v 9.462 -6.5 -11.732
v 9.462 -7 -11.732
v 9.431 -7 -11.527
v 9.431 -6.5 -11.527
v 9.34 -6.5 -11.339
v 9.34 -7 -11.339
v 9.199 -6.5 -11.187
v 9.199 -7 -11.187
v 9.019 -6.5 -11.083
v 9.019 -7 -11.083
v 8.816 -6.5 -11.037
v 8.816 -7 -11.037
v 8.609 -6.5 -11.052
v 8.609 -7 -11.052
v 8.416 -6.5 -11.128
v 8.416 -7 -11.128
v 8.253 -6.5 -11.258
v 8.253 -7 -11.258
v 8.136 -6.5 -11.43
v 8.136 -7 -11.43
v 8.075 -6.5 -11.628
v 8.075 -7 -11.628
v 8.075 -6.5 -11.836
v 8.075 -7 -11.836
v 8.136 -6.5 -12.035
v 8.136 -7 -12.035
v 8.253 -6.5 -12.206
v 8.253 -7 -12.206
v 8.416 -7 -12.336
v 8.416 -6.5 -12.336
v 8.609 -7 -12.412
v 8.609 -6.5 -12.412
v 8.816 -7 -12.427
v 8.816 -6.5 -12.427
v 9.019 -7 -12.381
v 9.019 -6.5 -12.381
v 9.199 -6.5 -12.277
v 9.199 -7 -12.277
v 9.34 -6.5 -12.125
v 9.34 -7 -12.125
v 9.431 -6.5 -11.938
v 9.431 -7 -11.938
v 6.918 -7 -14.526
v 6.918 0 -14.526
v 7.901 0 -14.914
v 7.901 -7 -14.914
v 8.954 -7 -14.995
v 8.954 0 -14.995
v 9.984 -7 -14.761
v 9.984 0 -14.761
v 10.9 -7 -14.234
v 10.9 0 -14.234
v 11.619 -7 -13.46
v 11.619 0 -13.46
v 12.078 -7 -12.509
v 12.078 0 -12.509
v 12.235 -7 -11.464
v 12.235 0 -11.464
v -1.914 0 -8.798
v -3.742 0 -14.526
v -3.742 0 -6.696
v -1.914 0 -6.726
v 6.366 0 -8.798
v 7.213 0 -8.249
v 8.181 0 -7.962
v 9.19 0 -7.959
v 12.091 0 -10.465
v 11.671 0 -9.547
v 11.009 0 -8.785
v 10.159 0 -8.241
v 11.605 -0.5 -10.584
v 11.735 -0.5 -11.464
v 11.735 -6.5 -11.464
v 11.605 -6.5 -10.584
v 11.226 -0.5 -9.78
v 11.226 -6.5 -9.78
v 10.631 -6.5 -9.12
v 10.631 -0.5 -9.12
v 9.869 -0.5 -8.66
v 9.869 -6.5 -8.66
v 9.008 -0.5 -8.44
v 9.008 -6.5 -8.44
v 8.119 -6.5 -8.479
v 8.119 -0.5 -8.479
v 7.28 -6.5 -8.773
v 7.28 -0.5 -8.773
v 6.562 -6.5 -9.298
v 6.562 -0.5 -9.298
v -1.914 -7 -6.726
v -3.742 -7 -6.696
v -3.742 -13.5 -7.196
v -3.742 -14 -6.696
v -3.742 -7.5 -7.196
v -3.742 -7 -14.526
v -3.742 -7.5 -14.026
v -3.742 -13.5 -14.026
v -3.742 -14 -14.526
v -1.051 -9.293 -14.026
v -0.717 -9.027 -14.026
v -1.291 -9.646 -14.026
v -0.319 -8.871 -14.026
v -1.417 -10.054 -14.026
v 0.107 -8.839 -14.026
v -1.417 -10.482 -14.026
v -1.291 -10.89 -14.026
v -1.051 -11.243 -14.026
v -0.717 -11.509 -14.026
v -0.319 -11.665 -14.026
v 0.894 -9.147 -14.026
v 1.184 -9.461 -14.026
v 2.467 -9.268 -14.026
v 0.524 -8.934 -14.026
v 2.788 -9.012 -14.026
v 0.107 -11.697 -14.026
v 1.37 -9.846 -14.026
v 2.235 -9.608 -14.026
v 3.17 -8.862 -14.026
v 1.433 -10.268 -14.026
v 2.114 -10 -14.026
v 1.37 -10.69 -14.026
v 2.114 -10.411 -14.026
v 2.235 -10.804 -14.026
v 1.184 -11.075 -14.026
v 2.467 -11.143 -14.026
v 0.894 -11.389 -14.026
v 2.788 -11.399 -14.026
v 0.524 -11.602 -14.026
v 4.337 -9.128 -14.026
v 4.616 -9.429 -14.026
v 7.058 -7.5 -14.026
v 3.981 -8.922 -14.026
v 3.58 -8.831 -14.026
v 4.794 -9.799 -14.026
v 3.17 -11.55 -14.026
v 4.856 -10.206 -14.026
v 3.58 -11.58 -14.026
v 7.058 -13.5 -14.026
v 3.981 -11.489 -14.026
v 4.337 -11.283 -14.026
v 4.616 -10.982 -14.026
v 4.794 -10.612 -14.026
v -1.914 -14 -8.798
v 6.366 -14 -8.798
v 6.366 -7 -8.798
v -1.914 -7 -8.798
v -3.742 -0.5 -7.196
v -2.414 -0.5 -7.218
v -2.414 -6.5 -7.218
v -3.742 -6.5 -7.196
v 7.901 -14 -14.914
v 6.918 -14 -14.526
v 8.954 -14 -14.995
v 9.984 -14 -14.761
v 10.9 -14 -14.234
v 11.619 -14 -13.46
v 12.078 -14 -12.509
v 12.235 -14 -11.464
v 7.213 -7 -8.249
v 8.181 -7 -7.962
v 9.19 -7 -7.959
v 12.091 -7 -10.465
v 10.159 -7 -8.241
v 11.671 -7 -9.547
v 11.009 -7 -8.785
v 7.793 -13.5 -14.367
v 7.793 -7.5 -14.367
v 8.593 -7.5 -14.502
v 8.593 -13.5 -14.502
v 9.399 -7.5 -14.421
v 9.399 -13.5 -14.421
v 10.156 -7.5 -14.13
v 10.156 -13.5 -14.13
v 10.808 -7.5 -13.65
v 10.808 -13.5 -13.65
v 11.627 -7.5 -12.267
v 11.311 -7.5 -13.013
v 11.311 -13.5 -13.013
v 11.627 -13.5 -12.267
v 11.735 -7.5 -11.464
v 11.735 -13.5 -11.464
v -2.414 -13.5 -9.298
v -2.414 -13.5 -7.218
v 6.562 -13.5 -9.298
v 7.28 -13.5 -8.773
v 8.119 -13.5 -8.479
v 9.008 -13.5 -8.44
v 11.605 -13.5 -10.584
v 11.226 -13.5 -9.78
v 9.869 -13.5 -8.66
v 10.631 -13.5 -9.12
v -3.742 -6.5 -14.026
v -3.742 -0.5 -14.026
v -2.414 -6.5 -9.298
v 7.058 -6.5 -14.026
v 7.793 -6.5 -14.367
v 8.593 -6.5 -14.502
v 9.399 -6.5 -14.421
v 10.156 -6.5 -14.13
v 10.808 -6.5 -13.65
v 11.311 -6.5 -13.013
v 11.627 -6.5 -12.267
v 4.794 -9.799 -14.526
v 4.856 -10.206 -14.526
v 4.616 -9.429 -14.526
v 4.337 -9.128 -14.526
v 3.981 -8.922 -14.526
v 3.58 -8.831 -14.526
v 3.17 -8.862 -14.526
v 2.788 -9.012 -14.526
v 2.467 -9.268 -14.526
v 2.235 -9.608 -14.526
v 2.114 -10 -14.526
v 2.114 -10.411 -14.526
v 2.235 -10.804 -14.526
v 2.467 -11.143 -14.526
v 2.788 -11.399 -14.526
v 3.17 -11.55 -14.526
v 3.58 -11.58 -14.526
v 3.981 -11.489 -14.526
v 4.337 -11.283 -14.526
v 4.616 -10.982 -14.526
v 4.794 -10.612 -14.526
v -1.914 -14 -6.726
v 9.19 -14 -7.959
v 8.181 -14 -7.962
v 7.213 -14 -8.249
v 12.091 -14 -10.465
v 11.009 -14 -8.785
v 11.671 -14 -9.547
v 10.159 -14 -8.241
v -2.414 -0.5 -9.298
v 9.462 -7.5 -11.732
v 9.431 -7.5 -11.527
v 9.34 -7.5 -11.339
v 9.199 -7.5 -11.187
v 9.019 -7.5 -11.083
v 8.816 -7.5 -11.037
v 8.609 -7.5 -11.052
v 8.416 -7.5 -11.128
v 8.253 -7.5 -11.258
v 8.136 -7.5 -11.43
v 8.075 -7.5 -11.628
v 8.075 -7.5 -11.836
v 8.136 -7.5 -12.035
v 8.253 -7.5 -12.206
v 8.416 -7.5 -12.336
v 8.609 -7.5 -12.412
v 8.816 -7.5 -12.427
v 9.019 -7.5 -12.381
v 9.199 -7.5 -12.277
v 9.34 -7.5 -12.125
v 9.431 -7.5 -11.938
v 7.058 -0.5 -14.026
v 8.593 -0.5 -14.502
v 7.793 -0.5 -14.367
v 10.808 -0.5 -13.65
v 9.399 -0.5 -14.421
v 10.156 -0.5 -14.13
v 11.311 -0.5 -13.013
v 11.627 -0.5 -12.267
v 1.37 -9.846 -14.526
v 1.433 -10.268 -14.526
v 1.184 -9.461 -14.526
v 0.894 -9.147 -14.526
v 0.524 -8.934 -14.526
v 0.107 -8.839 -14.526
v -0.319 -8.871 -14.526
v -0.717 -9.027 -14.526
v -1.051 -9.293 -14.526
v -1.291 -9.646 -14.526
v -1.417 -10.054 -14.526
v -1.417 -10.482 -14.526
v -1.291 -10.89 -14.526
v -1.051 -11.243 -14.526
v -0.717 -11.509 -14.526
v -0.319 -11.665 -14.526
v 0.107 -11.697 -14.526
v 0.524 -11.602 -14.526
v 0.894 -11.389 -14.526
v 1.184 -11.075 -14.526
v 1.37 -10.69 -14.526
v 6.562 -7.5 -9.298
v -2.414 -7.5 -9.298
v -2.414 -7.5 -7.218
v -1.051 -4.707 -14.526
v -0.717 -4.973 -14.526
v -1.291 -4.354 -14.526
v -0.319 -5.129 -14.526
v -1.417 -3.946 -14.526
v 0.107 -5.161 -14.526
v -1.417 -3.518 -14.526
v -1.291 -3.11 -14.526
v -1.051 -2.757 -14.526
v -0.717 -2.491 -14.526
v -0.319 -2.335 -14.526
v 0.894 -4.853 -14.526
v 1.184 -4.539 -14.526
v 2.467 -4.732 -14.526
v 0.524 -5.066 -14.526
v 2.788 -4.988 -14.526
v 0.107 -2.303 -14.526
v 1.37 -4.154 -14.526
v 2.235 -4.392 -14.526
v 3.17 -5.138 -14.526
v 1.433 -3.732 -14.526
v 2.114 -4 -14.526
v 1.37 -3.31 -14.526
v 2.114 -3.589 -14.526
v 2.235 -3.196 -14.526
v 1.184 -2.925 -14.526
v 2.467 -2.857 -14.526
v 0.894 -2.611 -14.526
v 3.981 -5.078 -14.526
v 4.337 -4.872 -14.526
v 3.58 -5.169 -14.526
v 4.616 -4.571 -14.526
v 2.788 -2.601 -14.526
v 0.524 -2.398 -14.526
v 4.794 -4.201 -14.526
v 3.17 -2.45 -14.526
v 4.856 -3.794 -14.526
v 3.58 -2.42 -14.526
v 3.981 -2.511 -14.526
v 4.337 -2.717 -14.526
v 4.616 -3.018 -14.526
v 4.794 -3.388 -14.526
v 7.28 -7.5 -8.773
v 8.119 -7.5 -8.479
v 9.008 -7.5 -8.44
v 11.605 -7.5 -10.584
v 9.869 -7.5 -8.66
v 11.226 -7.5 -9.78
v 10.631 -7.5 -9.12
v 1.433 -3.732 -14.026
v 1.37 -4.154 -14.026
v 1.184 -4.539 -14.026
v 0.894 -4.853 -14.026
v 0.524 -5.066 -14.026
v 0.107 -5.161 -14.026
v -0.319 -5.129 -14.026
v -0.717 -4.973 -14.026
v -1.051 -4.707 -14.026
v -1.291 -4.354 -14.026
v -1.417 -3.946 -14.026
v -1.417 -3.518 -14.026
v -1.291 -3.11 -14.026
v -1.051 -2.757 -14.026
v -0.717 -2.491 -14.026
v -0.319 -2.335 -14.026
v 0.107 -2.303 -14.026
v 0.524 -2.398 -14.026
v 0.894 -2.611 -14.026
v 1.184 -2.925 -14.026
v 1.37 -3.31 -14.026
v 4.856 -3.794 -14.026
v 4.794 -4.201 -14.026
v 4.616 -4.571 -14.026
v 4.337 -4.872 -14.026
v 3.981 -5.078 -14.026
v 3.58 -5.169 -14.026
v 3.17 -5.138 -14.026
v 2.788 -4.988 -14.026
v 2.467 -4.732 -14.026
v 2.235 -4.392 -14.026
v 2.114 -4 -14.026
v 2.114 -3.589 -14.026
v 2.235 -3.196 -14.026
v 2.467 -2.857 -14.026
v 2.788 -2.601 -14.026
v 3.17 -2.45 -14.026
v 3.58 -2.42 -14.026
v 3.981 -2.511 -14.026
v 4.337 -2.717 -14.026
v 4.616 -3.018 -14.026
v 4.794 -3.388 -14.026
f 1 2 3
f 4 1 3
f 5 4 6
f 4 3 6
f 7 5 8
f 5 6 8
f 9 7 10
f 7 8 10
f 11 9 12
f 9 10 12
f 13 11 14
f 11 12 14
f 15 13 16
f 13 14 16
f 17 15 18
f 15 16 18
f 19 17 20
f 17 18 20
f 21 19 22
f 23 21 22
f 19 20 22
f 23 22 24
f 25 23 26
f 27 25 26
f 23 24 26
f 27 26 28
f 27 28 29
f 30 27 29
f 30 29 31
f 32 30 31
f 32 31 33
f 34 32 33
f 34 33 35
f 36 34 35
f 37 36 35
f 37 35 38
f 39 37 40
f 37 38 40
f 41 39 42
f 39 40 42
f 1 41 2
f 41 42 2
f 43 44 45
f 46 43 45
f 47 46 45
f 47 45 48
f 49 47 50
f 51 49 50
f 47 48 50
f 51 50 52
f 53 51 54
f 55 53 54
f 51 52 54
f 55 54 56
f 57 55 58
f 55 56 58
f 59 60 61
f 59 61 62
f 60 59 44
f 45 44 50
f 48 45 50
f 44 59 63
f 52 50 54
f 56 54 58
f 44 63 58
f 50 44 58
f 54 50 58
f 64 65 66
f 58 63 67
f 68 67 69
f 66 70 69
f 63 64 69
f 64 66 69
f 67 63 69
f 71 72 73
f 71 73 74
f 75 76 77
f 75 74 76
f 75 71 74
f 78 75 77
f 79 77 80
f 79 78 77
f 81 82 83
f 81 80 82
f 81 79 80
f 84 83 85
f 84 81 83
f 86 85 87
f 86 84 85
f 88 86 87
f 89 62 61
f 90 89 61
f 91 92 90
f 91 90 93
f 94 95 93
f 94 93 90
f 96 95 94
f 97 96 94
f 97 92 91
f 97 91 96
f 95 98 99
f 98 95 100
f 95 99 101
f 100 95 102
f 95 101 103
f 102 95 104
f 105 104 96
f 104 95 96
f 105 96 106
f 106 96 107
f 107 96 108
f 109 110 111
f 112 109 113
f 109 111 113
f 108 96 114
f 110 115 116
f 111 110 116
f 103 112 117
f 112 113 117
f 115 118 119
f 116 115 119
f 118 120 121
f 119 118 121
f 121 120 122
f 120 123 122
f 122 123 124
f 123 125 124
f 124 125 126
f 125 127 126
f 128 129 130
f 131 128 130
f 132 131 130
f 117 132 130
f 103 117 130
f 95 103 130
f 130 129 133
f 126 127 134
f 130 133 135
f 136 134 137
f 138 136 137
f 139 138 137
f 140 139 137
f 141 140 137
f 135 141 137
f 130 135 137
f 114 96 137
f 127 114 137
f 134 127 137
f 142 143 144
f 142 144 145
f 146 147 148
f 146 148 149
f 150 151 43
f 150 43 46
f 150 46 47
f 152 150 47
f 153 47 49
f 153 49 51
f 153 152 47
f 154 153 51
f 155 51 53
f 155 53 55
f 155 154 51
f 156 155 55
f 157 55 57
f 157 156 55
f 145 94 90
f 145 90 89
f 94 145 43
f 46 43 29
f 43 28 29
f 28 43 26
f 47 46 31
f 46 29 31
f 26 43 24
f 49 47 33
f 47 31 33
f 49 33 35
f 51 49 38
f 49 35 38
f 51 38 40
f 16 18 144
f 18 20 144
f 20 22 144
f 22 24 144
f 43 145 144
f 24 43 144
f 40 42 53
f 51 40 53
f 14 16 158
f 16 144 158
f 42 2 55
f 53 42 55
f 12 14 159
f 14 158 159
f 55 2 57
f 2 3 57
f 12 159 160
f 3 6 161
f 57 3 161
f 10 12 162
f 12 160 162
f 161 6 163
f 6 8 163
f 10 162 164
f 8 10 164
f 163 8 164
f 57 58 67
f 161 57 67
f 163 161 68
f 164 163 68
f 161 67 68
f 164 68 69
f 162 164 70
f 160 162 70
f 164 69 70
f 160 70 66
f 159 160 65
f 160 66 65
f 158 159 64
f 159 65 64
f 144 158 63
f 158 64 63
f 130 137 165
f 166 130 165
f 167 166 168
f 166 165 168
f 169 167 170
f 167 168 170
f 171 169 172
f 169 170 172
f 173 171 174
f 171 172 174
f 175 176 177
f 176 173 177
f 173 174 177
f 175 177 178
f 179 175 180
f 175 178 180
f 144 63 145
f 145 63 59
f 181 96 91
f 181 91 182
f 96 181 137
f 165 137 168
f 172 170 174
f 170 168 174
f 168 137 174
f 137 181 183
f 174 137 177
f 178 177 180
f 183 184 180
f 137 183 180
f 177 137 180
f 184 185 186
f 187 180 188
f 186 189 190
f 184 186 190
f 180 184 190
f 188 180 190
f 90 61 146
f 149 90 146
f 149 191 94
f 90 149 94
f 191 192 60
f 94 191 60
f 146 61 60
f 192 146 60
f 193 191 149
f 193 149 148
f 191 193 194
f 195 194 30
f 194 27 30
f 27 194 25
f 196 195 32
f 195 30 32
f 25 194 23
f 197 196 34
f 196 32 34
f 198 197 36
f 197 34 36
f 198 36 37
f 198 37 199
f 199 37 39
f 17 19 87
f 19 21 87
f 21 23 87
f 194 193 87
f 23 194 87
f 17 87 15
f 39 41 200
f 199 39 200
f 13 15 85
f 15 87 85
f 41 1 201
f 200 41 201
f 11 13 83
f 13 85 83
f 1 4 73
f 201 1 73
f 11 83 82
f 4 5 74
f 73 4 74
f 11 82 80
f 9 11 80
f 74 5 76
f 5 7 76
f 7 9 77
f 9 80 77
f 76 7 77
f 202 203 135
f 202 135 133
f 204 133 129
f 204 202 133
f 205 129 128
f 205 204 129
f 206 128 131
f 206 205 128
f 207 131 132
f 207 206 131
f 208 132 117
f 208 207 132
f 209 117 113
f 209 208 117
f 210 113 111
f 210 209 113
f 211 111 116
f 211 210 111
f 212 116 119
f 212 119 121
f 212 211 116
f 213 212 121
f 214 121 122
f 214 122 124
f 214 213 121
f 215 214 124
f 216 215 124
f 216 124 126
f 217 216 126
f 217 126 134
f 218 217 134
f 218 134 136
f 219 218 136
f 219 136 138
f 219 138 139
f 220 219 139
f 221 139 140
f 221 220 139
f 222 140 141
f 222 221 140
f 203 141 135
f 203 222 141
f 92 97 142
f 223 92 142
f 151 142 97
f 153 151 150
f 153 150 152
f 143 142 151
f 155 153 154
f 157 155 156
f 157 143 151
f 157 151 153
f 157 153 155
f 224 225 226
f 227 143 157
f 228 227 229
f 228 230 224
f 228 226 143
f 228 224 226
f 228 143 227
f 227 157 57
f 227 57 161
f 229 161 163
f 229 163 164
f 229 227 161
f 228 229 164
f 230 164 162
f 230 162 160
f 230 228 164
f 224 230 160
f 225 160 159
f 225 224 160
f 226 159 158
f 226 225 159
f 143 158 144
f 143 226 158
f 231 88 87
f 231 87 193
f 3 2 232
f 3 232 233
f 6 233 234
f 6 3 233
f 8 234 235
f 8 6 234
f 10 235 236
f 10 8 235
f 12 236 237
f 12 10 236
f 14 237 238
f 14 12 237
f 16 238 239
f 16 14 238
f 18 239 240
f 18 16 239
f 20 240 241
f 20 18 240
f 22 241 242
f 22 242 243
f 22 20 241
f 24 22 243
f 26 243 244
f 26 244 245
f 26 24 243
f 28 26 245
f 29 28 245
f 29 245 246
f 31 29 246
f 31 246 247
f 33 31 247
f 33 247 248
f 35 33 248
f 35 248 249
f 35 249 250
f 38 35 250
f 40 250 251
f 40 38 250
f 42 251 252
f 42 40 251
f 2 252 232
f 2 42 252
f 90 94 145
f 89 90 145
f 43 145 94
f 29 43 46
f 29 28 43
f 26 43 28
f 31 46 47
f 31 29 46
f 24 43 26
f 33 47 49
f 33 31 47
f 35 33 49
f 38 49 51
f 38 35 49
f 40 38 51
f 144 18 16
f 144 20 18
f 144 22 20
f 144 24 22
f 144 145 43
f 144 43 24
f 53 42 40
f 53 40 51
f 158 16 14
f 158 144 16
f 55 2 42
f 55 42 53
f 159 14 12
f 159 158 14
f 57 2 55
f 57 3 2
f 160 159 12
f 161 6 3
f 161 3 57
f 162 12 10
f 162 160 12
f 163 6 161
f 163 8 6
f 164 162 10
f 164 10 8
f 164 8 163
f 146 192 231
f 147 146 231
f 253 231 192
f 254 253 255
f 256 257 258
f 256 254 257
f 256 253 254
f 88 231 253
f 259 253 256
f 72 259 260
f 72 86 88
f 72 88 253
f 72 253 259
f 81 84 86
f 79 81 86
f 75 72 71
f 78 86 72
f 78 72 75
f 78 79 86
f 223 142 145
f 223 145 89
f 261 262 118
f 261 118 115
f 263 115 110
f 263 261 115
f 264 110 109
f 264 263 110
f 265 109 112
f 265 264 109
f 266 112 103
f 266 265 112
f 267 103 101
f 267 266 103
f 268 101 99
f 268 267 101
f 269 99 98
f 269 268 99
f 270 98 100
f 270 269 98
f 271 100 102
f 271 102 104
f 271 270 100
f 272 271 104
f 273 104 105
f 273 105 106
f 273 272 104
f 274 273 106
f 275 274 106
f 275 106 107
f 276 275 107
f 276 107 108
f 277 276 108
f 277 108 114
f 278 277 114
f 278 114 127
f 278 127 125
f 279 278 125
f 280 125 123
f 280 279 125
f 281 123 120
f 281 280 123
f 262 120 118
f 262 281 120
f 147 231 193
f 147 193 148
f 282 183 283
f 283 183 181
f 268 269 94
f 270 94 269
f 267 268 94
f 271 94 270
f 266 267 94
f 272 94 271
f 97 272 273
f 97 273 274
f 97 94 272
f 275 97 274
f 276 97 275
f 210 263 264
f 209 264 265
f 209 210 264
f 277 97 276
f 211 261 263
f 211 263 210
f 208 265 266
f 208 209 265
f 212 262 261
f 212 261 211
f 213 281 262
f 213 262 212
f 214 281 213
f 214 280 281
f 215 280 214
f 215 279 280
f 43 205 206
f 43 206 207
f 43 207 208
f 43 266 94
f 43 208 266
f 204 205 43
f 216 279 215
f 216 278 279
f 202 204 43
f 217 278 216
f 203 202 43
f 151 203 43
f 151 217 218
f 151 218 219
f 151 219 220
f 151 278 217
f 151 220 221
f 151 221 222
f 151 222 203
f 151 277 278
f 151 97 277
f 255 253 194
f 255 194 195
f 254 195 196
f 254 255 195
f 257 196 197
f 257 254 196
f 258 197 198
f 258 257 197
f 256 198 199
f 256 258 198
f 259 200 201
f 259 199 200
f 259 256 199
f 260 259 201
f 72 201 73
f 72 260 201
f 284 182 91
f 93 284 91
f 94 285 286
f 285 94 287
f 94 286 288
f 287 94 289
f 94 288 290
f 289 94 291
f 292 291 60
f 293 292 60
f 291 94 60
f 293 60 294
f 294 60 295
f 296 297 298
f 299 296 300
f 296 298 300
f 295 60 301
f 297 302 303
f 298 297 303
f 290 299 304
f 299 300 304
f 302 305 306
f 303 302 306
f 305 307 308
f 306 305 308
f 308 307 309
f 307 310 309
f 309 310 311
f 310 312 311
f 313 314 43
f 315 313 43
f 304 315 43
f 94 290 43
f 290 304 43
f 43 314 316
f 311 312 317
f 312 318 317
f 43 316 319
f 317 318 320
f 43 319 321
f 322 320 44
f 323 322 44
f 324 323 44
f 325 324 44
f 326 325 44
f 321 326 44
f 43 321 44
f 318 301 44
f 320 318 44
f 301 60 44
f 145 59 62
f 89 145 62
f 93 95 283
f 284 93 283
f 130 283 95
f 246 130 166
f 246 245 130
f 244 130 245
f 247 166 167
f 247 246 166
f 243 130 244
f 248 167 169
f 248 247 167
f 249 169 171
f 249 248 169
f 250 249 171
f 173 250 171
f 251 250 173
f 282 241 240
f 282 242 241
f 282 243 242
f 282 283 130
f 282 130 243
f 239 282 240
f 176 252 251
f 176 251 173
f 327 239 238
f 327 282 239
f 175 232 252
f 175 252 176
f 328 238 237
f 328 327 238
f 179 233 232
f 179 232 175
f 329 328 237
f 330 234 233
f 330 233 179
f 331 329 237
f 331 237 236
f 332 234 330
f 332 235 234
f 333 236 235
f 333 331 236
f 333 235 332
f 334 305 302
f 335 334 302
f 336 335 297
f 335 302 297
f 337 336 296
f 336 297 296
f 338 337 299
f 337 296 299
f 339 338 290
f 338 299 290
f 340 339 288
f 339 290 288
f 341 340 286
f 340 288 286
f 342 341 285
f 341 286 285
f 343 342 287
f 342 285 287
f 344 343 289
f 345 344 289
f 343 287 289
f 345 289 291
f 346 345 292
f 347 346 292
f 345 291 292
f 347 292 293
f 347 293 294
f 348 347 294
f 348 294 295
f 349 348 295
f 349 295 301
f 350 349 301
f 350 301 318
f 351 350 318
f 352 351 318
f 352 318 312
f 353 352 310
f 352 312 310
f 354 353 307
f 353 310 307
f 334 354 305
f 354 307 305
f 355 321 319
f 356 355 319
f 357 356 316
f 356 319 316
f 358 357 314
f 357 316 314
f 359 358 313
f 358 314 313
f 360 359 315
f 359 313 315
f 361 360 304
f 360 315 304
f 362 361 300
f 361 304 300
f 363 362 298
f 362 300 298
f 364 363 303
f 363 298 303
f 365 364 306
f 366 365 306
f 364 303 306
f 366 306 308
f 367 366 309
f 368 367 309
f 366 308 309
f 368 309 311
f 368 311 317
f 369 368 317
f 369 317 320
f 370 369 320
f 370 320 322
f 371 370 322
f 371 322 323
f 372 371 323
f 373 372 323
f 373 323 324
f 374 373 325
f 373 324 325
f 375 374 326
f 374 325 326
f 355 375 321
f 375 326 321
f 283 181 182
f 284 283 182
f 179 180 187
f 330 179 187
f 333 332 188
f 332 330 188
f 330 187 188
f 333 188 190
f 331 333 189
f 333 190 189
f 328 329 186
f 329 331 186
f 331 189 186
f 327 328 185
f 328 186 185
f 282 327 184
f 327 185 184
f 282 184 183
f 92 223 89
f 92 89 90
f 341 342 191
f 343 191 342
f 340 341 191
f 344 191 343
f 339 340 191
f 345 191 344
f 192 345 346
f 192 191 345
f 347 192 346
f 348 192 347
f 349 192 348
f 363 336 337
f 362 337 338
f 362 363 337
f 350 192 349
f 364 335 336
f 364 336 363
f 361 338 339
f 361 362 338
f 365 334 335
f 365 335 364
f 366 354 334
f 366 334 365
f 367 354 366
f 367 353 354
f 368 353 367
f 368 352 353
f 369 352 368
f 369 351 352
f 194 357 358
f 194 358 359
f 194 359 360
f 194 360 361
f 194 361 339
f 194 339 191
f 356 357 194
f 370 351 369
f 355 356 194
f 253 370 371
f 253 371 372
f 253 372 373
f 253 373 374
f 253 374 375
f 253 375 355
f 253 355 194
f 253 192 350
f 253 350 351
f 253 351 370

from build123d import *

# Parameters (mm, degrees)
F1_DEPTH = 7
F2_T     = -0.5
F3_R     = 1.3784685207
F3_R_2   = 1.433307667
F4_DEPTH = 0.5
F6_R     = 0.6972835292
F7_DEPTH = 0.5


with BuildPart() as f1:
    # F0 (on Front) → F1 (new body)
    with BuildSketch(Plane.XZ):
        with BuildLine():
            Line((7.3175162697, -14.5256563758), (6.9182340267, -14.5256563758))
            ThreePointArc((6.9182340267, -14.5256563758), (10.4617303531, -14.5317281984), (12.2352336133, -11.4639783278))
            ThreePointArc((12.2352336133, -11.4639783278), (10.1593911767, -8.2409606999), (6.3663959695, -8.7978734482))
            Line((6.3663959695, -8.7978734482), (7.3175162697, -8.7978734482))
            Line((7.3175162697, -8.7978734482), (7.3175162697, -14.5256563758))
        make_face()
        with BuildLine():
            ThreePointArc((6.3663959695, -8.7978734482), (5.1715495813, -11.8034644737), (6.9182340267, -14.5256563758))
            Line((6.9182340267, -14.5256563758), (7.3175162697, -14.5256563758))
            Line((7.3175162697, -14.5256563758), (7.3175162697, -8.7978734482))
            Line((7.3175162697, -8.7978734482), (6.3663959695, -8.7978734482))
        make_face()
        with BuildLine():
            Line((-3.7424837303, -6.6956563758), (-3.7424837303, -14.5256563758))
            Line((-3.7424837303, -14.5256563758), (6.9182340267, -14.5256563758))
            ThreePointArc((6.9182340267, -14.5256563758), (5.1715495813, -11.8034644737), (6.3663959695, -8.7978734482))
            Line((6.3663959695, -8.7978734482), (-1.9144690588, -8.7978734482))
            Line((-1.9144690588, -8.7978734482), (-1.9144690588, -6.7261224193))
            Line((-1.9144690588, -6.7261224193), (-3.7424837303, -6.6956563758))
        make_face()
    extrude(amount=F1_DEPTH)

    # F2
    f2_openings = [f1.faces().sort_by_distance(p)[0] for p in [
        (-3.742484, -3.5, -10.610656),
    ]]
    offset(amount=F2_T, openings=f2_openings, kind=Kind.INTERSECTION)

    # F3 (on face) → F4 (cut, through all)
    with BuildSketch(Plane(origin=(0, 0, -14.5256563758), x_dir=(1, 0, 0), z_dir=(0, 0, -1))):
        with Locations((3.4770593047, 3.7943422794)):
            Circle(F3_R)
        with Locations((0, 3.7320032716)):
            Circle(F3_R_2)
    extrude(amount=-F4_DEPTH, mode=Mode.SUBTRACT)

    # F6 (on face) → F7 (cut, through all)
    with BuildSketch(Plane.XZ.offset(7)):
        with Locations((8.7642520666, -11.7320865393)):
            Circle(F6_R)
    extrude(amount=-F7_DEPTH, mode=Mode.SUBTRACT)


with BuildPart() as f8_1:
    # F8: instance of F1
    add(f1.part.mirror(Plane.XZ.offset(7)))


solid = Compound([f1.part, f8_1.part])
